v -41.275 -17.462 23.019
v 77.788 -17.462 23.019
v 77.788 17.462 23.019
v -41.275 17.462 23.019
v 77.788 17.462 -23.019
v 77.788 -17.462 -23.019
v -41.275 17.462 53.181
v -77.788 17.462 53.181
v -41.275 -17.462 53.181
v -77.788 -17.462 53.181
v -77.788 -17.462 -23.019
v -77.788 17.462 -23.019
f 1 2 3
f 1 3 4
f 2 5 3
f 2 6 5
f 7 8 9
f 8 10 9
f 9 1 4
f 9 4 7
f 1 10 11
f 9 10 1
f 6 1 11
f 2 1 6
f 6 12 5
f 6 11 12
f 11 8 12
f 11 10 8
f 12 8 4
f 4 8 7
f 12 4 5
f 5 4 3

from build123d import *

# Parameters (mm, degrees)
F0_W     = 36.5125
F0_H     = 30.1625
F1_DEPTH = 17.4625


with BuildPart() as f1:
    # F0 (on Front) → F1 (new body, symmetric)
    with BuildSketch(Plane.XZ):
        Polygon((77.7875, -23.01875), (77.7875, 23.01875), (-41.275, 23.01875), (-77.7875, 23.01875), (-77.7875, -23.01875), align=None)
        with Locations((-59.53125, 38.1)):
            Rectangle(F0_W, F0_H)
    extrude(amount=F1_DEPTH, both=True)


solid = f1.part
